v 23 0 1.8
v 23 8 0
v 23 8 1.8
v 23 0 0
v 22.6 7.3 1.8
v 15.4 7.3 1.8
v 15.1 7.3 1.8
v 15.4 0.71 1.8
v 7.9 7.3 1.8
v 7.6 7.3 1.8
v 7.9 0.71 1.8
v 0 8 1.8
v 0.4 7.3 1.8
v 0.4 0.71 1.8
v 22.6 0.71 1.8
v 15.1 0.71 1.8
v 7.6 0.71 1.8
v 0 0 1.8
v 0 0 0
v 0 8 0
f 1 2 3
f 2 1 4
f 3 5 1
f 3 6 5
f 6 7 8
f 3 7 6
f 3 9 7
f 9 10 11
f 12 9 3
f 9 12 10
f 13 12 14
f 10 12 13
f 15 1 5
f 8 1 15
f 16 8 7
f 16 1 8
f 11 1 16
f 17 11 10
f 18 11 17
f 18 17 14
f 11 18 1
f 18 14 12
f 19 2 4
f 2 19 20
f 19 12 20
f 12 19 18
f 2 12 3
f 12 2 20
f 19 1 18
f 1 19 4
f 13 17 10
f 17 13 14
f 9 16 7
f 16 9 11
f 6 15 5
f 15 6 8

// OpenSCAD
difference(){
 
    color("#f3f3f3")
    cube([23,8,1.8]);

    // remove some block
    translate([0.4, 0.71, 0.1])
    for(j=[0:2]){

        translate([7.5*j, 0.0, 0.0])
        cube([7.2,6.59,1.8]);   
    }
    
    // remove space for + pin
    translate([-0.1, 0.3, -0.1])
    cube([2.1,7.4,1]);
      
    // remove space for - pin
    translate([21, 0.3, -0.1])
    cube([2.1,7.4,1]);
}

// add cells
color("#000000")
translate([0.4, 0.71, 0.1])

for(j=[0:2]){

    translate([7.5*j, 0.0, 0.0])
    cube([7.2,6.59,1.7]); 
}

// add + pin
color("#FAE481")
translate([0, 0.3, 0])
cube([2,7.4,0.9]);

// add - pin
color("#FAE481")
translate([21, 0.3, 0])
cube([2,7.4,0.9]);
